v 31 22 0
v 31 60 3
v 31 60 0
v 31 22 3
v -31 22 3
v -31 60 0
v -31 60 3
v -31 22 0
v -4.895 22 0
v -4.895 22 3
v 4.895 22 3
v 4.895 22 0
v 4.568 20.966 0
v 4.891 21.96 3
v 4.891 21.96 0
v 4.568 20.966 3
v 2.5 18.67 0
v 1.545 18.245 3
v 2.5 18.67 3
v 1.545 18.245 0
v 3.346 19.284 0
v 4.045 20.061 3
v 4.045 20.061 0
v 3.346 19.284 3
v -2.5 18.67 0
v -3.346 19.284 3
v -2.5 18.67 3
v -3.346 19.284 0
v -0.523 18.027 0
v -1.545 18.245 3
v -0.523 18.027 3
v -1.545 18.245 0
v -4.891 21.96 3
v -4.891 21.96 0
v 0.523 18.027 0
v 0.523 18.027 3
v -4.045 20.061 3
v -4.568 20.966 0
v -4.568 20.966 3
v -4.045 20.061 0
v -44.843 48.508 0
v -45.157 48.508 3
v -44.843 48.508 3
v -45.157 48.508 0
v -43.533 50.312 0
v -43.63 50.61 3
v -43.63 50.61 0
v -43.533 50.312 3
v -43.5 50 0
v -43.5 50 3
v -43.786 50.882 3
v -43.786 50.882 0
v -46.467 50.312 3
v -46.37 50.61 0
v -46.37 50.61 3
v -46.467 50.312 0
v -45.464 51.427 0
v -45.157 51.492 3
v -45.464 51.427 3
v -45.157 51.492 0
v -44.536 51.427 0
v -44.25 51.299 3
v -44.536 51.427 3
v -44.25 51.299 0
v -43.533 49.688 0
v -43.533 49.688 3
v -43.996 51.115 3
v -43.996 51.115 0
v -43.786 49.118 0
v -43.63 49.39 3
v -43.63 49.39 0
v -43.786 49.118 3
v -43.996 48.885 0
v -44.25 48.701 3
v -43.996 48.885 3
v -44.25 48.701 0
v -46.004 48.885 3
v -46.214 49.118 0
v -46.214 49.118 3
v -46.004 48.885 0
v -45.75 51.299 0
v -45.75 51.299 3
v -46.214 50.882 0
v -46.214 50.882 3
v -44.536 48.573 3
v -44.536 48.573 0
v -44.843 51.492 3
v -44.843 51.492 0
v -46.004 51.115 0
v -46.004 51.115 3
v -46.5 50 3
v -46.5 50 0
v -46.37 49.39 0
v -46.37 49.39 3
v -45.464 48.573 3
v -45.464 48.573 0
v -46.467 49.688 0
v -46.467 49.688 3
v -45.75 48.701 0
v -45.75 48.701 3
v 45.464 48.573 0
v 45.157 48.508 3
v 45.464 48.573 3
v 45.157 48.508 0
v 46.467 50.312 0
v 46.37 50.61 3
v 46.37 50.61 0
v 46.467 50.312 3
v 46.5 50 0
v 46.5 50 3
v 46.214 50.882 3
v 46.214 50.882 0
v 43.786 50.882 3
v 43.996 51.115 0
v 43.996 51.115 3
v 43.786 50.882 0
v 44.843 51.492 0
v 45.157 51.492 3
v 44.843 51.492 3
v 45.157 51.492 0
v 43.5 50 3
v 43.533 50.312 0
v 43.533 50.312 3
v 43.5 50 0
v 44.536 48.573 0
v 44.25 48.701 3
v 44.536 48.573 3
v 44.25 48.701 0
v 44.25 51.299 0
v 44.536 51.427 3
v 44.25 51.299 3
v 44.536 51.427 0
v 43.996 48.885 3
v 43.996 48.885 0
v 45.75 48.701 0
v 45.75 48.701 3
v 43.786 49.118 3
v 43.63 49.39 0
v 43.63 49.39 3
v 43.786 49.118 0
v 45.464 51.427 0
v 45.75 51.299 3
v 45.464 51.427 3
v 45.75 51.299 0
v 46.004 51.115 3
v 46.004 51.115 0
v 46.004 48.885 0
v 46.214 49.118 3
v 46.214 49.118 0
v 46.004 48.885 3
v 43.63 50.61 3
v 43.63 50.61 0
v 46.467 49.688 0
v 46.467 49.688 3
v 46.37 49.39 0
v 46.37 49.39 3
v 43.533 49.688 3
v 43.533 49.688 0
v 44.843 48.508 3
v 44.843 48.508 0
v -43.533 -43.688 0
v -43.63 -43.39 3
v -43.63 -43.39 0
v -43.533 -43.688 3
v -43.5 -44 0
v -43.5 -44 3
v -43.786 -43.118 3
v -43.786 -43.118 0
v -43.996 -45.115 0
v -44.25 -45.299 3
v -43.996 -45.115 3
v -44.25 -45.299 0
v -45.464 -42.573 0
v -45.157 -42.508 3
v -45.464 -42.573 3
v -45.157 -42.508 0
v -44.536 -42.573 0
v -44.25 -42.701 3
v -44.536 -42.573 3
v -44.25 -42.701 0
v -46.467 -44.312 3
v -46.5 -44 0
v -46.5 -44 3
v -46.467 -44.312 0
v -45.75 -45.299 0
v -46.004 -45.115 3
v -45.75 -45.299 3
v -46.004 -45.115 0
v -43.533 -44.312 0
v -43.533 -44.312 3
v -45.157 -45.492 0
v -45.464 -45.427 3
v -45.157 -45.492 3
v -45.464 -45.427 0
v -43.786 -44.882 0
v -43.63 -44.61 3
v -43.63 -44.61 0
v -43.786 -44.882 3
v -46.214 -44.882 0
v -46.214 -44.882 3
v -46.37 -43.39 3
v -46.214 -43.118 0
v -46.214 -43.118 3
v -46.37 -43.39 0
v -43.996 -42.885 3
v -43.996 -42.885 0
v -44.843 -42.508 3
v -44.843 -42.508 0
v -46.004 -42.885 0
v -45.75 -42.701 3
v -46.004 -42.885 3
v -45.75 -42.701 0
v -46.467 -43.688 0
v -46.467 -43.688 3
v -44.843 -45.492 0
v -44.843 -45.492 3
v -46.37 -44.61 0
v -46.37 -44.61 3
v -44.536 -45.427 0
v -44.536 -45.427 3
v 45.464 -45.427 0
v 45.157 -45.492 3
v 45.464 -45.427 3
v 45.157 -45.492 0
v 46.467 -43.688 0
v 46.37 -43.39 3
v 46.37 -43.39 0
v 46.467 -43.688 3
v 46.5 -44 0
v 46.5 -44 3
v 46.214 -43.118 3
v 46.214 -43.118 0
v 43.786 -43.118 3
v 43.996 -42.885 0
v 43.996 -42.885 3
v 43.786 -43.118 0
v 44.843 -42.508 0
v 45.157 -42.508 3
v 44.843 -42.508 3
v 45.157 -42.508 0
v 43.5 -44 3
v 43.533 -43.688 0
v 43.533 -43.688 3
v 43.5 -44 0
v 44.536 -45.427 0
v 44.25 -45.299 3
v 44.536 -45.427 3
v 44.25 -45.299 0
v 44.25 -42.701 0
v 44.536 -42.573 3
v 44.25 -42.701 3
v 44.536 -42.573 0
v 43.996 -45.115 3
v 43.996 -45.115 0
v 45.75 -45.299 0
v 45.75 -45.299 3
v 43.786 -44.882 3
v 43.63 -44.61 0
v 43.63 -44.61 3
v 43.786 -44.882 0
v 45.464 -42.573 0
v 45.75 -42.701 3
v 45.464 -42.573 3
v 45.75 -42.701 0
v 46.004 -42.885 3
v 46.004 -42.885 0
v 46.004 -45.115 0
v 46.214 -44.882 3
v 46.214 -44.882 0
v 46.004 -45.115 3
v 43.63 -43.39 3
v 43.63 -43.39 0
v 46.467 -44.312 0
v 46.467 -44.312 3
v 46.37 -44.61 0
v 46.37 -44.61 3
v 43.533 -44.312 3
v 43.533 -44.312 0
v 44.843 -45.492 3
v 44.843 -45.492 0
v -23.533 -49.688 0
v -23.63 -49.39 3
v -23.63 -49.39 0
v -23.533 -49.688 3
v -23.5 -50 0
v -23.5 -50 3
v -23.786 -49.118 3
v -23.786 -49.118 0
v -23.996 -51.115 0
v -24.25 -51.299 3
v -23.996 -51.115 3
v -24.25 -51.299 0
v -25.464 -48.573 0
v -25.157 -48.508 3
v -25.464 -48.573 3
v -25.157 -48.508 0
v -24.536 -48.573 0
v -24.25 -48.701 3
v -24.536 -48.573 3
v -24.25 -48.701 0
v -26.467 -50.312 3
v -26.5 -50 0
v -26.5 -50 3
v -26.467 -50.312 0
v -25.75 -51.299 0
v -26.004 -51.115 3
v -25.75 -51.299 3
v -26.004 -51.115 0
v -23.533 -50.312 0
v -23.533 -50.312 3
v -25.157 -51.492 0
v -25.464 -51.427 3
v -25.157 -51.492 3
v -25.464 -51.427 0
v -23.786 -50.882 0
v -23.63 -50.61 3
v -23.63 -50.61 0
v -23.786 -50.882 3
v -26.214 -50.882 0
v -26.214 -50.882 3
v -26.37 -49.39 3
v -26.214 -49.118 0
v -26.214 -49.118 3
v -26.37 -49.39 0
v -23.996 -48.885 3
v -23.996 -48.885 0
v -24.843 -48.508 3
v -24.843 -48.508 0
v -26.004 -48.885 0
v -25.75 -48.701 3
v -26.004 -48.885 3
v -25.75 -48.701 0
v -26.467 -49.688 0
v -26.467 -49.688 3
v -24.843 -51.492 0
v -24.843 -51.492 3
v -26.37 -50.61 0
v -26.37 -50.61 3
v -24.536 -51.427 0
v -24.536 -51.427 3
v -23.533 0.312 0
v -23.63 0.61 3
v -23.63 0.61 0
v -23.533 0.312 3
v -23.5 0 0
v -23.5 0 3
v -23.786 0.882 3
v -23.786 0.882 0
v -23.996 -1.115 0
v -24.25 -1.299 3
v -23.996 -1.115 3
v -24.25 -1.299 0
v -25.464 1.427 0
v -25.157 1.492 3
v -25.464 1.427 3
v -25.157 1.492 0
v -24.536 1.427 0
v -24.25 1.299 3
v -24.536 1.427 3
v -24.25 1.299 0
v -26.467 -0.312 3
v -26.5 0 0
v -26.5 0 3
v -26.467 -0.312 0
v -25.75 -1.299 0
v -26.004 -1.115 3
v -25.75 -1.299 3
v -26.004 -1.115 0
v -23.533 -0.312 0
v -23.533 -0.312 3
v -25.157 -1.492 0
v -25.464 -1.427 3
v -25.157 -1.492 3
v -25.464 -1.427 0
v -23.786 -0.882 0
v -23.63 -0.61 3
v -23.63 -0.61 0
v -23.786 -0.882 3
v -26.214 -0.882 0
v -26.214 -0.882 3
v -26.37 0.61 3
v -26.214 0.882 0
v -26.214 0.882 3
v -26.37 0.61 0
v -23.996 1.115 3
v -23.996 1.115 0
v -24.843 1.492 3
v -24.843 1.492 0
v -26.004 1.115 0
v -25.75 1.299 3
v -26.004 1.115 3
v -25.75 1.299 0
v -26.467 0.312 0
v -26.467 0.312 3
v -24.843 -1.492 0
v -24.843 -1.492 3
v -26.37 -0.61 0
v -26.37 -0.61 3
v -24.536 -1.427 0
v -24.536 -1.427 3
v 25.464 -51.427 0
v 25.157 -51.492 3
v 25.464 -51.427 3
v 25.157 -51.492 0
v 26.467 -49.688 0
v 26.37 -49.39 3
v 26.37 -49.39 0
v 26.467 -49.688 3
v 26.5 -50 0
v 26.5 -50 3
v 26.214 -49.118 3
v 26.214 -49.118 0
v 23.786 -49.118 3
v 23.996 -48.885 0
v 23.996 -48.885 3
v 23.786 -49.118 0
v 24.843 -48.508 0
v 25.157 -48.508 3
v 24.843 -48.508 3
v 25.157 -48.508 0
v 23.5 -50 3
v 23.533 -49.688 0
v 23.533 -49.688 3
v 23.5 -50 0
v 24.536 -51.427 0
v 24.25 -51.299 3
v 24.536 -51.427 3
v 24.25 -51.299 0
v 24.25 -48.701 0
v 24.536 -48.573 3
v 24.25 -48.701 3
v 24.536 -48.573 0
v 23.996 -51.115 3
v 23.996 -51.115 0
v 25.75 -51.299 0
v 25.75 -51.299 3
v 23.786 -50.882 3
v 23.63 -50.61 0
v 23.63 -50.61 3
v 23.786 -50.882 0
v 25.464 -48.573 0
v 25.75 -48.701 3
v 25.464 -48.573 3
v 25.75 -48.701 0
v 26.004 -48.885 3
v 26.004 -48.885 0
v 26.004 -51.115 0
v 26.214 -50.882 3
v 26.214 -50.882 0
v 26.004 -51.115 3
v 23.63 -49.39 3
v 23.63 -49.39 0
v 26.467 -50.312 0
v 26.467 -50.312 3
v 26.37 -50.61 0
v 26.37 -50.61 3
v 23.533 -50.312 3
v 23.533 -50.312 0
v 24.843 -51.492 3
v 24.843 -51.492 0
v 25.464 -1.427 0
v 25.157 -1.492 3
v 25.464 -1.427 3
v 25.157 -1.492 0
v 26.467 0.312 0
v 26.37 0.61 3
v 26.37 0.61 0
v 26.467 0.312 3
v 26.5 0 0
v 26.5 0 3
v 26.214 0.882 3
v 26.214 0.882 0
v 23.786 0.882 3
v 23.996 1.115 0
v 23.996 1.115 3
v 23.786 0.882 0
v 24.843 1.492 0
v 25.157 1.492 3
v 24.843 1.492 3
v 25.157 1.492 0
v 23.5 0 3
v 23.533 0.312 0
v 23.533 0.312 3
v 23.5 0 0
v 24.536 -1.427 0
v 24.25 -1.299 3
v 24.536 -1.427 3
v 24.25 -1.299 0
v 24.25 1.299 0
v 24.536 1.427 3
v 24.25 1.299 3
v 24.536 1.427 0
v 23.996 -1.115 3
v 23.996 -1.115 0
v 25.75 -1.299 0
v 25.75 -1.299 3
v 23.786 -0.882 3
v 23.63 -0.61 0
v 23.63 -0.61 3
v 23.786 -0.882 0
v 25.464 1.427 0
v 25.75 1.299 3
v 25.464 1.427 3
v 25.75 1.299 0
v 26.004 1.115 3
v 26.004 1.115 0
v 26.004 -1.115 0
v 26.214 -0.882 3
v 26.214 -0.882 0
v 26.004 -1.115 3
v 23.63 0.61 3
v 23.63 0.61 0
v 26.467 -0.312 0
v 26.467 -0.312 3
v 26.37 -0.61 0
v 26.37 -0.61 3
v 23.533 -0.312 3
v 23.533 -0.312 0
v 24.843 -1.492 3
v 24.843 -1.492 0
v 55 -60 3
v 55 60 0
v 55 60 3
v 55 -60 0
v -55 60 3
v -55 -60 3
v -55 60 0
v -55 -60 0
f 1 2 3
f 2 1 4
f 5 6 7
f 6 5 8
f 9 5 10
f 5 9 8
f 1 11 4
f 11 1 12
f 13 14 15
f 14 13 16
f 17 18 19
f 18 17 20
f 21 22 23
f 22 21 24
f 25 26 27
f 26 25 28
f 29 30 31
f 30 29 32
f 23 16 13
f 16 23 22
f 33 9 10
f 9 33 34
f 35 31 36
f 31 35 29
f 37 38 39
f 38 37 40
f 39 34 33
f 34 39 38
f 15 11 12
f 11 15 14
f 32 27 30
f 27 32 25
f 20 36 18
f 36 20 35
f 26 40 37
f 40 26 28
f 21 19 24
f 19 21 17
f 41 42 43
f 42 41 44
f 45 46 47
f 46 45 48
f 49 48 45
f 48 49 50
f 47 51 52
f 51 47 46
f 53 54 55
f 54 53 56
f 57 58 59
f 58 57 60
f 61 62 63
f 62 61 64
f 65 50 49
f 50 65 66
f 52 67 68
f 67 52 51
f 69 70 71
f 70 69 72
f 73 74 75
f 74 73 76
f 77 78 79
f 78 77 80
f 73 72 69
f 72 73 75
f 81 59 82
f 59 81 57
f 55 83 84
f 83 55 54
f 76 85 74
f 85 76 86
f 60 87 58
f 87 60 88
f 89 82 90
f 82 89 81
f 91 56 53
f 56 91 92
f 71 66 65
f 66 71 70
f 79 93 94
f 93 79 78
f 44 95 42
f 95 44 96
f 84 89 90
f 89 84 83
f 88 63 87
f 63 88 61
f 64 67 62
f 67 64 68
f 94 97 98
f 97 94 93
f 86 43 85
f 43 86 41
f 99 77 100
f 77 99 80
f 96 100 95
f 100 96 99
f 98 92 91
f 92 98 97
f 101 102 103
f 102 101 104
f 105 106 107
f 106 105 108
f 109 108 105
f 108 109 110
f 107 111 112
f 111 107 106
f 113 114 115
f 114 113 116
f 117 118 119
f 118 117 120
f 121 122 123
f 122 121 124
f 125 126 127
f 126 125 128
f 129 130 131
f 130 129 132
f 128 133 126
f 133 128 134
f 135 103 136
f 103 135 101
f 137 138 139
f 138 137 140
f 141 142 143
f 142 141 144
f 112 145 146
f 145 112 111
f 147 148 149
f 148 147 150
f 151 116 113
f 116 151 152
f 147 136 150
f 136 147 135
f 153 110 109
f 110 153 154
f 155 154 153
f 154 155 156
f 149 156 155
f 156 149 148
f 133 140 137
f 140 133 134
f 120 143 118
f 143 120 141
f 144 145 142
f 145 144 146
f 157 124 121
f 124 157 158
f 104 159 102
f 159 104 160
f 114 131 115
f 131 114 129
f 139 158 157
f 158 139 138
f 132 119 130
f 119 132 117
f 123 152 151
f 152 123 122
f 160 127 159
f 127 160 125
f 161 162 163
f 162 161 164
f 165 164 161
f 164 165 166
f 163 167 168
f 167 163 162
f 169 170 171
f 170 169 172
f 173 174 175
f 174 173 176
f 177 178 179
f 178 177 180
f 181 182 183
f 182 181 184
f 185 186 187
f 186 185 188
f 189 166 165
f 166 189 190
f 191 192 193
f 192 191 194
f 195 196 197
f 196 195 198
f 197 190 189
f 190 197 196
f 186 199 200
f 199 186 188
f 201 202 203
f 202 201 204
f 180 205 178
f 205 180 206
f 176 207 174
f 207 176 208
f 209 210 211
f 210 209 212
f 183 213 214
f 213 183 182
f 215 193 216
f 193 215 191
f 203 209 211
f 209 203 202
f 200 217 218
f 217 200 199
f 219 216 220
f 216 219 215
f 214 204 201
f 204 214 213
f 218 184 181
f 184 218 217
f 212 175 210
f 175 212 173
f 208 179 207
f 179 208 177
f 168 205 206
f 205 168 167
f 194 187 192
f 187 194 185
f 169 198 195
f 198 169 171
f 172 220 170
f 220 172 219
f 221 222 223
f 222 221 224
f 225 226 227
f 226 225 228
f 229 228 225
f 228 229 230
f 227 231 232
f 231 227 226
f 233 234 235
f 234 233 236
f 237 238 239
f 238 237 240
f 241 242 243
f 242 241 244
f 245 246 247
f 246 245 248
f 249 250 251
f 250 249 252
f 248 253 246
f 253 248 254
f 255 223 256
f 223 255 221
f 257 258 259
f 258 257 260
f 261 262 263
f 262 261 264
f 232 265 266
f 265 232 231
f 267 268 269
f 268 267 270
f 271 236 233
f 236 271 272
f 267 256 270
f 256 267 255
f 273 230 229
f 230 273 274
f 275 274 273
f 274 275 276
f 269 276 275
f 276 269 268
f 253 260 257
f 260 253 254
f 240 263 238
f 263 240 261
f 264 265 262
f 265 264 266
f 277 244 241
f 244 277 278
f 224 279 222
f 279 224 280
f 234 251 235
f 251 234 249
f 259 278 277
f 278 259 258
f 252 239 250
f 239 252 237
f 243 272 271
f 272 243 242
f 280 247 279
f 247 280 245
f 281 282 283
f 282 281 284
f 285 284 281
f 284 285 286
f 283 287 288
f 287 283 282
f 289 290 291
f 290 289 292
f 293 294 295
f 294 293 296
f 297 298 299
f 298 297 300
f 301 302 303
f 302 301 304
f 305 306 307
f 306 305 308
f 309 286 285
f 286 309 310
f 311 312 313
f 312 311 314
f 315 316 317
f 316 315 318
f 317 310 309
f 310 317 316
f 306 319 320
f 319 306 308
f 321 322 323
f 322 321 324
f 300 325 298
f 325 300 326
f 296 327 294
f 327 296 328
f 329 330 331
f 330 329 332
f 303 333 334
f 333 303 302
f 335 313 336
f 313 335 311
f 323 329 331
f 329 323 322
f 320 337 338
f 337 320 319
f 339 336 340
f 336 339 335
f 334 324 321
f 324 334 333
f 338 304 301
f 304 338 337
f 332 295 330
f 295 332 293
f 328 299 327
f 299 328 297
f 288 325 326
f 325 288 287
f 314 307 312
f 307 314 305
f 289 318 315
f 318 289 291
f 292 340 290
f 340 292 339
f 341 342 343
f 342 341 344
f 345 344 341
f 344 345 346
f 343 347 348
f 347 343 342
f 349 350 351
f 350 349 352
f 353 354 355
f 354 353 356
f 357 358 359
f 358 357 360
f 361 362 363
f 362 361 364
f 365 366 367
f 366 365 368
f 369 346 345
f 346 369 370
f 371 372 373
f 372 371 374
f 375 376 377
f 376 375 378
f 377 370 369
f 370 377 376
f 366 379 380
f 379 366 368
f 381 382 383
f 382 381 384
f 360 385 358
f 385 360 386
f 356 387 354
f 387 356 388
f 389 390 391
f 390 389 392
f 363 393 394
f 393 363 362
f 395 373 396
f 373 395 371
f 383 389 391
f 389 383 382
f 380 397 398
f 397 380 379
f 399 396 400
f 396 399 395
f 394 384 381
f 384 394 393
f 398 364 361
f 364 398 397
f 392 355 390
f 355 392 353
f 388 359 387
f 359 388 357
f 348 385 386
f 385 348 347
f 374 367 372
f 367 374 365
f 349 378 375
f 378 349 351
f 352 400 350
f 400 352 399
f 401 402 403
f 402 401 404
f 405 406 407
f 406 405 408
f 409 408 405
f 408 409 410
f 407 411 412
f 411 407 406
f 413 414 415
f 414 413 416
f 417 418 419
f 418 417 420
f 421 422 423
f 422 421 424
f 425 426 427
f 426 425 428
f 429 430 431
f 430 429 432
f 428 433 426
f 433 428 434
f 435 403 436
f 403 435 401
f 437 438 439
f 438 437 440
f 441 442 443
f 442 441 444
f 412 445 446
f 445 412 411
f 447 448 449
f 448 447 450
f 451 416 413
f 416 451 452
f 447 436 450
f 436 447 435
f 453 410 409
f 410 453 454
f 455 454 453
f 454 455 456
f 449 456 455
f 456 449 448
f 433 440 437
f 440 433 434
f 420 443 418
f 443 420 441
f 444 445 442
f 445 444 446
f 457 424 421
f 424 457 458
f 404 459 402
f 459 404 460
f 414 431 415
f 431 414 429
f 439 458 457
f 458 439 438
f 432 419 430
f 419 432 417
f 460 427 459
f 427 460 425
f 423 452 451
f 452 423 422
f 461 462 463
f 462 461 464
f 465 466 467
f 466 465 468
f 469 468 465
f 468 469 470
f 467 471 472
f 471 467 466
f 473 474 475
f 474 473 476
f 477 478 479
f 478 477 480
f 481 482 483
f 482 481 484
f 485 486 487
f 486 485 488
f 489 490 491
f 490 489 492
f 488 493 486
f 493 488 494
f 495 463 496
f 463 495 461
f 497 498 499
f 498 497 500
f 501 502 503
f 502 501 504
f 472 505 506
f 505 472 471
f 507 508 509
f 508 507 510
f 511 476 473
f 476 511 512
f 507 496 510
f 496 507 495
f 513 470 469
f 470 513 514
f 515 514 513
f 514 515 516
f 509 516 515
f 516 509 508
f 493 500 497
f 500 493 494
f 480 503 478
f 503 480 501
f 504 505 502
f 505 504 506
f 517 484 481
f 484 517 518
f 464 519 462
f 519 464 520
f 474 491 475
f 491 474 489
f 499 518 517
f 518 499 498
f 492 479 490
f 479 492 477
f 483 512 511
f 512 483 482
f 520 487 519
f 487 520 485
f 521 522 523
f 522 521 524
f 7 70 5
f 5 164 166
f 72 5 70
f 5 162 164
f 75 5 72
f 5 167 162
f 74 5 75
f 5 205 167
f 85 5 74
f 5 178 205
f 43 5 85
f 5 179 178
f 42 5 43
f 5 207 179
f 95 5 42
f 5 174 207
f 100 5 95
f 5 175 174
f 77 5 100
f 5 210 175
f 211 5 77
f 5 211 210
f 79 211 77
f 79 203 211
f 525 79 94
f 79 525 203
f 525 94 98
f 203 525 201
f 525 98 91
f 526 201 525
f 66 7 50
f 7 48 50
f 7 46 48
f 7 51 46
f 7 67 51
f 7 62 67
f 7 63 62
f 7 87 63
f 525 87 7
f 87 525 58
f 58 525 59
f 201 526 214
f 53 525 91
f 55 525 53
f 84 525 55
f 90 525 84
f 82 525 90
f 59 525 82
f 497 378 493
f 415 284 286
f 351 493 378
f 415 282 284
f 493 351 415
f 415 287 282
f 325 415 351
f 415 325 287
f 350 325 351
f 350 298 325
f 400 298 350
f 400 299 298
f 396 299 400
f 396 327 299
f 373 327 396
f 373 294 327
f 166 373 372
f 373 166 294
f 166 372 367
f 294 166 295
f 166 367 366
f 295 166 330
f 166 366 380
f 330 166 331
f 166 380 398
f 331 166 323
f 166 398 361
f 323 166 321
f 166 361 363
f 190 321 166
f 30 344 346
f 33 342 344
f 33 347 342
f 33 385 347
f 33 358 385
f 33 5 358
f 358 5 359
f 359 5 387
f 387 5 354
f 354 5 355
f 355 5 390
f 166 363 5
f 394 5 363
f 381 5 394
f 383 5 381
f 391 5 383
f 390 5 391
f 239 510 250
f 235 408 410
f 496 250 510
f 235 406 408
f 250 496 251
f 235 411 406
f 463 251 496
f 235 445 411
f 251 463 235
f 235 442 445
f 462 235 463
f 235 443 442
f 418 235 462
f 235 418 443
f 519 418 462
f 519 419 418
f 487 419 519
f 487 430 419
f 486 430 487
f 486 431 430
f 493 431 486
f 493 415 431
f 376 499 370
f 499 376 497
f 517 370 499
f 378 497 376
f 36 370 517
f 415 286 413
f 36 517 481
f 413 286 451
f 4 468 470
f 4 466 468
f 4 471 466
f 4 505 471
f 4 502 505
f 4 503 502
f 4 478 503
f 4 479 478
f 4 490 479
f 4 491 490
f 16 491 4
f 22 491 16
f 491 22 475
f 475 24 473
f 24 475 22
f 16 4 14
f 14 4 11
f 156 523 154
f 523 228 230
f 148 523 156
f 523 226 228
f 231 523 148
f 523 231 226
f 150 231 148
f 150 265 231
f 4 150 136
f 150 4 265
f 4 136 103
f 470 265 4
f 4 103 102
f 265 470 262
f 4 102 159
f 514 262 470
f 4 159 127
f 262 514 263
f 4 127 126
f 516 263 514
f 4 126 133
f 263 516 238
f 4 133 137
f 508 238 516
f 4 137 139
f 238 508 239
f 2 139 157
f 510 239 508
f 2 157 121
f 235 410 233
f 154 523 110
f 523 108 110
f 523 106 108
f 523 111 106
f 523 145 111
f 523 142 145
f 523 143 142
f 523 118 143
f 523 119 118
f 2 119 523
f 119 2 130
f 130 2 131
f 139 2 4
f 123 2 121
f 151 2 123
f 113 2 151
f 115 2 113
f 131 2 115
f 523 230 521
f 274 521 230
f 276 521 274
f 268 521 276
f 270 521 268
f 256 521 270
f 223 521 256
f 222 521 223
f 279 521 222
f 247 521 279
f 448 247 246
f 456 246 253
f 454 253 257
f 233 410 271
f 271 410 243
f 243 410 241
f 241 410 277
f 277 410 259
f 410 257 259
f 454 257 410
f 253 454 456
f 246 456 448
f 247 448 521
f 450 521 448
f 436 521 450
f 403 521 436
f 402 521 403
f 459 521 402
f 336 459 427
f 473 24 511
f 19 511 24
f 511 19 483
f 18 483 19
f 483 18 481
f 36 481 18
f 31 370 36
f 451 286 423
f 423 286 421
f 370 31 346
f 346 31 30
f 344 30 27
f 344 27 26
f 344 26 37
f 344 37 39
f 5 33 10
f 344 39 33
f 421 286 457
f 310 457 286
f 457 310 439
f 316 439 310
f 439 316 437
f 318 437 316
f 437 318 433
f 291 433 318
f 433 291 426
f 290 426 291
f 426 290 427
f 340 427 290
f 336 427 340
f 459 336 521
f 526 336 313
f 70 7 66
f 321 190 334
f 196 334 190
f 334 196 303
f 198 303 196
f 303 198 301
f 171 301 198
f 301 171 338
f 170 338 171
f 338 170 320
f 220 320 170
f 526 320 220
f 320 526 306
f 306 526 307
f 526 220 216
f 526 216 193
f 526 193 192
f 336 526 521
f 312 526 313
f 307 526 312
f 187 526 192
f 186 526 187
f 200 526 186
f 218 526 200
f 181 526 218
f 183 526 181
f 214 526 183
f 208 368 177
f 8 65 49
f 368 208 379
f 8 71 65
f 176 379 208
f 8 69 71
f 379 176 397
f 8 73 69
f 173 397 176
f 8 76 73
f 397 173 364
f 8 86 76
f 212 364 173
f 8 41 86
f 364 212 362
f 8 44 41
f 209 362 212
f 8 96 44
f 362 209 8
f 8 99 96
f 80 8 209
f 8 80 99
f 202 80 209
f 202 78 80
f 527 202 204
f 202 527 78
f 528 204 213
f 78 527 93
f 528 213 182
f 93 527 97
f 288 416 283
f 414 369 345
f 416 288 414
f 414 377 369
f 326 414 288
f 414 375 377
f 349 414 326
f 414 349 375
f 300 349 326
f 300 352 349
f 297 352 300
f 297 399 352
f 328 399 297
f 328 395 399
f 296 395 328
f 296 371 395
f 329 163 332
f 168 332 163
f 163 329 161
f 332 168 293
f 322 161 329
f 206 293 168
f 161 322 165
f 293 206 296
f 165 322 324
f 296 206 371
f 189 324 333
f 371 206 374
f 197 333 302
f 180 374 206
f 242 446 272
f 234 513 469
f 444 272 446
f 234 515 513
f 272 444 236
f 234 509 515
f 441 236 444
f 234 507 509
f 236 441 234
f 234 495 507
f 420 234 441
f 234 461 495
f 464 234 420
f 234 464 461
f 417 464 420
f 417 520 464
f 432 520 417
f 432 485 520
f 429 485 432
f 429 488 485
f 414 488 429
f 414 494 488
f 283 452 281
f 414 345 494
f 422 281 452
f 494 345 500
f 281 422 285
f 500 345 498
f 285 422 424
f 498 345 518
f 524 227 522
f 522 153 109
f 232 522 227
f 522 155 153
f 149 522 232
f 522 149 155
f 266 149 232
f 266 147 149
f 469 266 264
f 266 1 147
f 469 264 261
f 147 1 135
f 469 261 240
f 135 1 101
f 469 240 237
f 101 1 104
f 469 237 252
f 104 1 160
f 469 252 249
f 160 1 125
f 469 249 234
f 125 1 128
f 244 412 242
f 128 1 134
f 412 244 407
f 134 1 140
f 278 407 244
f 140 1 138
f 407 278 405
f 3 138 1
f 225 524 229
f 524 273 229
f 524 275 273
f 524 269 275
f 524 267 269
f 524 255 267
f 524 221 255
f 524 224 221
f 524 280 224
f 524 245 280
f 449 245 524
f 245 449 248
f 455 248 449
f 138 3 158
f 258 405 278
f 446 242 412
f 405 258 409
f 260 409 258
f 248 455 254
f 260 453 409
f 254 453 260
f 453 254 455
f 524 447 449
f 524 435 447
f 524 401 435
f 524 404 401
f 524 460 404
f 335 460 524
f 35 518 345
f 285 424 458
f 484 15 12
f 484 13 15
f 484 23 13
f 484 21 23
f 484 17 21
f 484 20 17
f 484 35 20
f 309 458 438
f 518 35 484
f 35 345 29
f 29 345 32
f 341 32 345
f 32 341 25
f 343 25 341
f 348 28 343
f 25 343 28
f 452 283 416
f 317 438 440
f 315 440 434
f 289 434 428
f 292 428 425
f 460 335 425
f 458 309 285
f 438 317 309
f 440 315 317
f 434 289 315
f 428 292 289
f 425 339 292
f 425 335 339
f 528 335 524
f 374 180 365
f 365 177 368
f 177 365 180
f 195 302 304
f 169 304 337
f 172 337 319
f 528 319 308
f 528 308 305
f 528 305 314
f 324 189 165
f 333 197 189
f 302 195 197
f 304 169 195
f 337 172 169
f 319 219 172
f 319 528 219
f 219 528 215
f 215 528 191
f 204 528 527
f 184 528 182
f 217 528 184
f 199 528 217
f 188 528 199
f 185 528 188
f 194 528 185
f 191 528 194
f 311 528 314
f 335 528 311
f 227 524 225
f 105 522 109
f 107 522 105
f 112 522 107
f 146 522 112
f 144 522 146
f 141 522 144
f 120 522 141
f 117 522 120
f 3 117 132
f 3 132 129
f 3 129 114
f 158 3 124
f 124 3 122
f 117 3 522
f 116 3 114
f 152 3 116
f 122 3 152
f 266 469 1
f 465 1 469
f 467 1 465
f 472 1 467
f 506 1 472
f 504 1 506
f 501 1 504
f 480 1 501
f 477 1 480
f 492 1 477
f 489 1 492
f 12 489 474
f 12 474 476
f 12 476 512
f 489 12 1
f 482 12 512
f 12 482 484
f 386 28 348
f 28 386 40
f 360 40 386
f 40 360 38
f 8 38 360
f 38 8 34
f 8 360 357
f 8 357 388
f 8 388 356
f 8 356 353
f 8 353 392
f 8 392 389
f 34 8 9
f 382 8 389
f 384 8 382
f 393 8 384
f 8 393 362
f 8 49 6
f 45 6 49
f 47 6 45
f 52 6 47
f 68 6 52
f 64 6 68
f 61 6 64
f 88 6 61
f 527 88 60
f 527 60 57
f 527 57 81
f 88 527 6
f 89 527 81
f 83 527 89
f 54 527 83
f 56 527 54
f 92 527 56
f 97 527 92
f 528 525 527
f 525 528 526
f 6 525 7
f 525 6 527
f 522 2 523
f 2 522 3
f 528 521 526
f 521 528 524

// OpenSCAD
$fs=0.2;

plate_width = 110.0;
plate_depth = 120.0;
plate_thickness = 3;

main_standoff_mounting_holes = [
  [-45,  50], [ 45,  50],
  [-45, -44], [ 45, -44],
];

module esc_cutout() {
    translate([0.0, plate_depth / 2.0, 0.0]) {
        cube([62.0, 38.0 * 2.0, plate_thickness * 4.0], 
            center=true);
    }
    translate([0.0, 23.0, 0.0]) {
        cylinder(h=10.0,r=5, center=true);
    }
}

module corner_cutouts() {
    union() {
        translate([plate_width / 2, plate_depth / 2, 0.0]) {
            rotate(60.0) {
                cube([20.0, 40.0, 8.0], center=true);
            }
        }
        translate([-plate_width / 2, plate_depth / 2, 0.0]) {
            rotate(-600.0) {
                cube([20.0, 40.0, 8.0], center=true);
            }
        }
    }
}

module power_switch_cutout() {
    translate([-45.0, 35.0, 0.0]) {
        cylinder(h=10.0,r=3.175, center=true);
    }
}

module main_plate_base() {
    translate([0.0, 0.0, plate_thickness / 2.0]) {
        cube([plate_width, plate_depth, plate_thickness], 
            center=true);
    }
    
}

module main_plate() {
    difference() {
        union() {
            main_plate_base();
        }
        union() {
            esc_cutout();
            //corner_cutouts();
            //power_switch_cutout();
            for (hole = main_standoff_mounting_holes) {
                translate([hole[0], hole[1], 0.0]) {
                    cylinder(h=10.0,r=1.5, center=true);
                }
            }
            for (x = [-1, 1], y=[-1, 1]) {
                translate([x * 25, y * 25-25, 0.0]) {
                    cylinder(h=10.0,r=1.5, center=true);
                }
            }
        }
    }
}


main_plate();
